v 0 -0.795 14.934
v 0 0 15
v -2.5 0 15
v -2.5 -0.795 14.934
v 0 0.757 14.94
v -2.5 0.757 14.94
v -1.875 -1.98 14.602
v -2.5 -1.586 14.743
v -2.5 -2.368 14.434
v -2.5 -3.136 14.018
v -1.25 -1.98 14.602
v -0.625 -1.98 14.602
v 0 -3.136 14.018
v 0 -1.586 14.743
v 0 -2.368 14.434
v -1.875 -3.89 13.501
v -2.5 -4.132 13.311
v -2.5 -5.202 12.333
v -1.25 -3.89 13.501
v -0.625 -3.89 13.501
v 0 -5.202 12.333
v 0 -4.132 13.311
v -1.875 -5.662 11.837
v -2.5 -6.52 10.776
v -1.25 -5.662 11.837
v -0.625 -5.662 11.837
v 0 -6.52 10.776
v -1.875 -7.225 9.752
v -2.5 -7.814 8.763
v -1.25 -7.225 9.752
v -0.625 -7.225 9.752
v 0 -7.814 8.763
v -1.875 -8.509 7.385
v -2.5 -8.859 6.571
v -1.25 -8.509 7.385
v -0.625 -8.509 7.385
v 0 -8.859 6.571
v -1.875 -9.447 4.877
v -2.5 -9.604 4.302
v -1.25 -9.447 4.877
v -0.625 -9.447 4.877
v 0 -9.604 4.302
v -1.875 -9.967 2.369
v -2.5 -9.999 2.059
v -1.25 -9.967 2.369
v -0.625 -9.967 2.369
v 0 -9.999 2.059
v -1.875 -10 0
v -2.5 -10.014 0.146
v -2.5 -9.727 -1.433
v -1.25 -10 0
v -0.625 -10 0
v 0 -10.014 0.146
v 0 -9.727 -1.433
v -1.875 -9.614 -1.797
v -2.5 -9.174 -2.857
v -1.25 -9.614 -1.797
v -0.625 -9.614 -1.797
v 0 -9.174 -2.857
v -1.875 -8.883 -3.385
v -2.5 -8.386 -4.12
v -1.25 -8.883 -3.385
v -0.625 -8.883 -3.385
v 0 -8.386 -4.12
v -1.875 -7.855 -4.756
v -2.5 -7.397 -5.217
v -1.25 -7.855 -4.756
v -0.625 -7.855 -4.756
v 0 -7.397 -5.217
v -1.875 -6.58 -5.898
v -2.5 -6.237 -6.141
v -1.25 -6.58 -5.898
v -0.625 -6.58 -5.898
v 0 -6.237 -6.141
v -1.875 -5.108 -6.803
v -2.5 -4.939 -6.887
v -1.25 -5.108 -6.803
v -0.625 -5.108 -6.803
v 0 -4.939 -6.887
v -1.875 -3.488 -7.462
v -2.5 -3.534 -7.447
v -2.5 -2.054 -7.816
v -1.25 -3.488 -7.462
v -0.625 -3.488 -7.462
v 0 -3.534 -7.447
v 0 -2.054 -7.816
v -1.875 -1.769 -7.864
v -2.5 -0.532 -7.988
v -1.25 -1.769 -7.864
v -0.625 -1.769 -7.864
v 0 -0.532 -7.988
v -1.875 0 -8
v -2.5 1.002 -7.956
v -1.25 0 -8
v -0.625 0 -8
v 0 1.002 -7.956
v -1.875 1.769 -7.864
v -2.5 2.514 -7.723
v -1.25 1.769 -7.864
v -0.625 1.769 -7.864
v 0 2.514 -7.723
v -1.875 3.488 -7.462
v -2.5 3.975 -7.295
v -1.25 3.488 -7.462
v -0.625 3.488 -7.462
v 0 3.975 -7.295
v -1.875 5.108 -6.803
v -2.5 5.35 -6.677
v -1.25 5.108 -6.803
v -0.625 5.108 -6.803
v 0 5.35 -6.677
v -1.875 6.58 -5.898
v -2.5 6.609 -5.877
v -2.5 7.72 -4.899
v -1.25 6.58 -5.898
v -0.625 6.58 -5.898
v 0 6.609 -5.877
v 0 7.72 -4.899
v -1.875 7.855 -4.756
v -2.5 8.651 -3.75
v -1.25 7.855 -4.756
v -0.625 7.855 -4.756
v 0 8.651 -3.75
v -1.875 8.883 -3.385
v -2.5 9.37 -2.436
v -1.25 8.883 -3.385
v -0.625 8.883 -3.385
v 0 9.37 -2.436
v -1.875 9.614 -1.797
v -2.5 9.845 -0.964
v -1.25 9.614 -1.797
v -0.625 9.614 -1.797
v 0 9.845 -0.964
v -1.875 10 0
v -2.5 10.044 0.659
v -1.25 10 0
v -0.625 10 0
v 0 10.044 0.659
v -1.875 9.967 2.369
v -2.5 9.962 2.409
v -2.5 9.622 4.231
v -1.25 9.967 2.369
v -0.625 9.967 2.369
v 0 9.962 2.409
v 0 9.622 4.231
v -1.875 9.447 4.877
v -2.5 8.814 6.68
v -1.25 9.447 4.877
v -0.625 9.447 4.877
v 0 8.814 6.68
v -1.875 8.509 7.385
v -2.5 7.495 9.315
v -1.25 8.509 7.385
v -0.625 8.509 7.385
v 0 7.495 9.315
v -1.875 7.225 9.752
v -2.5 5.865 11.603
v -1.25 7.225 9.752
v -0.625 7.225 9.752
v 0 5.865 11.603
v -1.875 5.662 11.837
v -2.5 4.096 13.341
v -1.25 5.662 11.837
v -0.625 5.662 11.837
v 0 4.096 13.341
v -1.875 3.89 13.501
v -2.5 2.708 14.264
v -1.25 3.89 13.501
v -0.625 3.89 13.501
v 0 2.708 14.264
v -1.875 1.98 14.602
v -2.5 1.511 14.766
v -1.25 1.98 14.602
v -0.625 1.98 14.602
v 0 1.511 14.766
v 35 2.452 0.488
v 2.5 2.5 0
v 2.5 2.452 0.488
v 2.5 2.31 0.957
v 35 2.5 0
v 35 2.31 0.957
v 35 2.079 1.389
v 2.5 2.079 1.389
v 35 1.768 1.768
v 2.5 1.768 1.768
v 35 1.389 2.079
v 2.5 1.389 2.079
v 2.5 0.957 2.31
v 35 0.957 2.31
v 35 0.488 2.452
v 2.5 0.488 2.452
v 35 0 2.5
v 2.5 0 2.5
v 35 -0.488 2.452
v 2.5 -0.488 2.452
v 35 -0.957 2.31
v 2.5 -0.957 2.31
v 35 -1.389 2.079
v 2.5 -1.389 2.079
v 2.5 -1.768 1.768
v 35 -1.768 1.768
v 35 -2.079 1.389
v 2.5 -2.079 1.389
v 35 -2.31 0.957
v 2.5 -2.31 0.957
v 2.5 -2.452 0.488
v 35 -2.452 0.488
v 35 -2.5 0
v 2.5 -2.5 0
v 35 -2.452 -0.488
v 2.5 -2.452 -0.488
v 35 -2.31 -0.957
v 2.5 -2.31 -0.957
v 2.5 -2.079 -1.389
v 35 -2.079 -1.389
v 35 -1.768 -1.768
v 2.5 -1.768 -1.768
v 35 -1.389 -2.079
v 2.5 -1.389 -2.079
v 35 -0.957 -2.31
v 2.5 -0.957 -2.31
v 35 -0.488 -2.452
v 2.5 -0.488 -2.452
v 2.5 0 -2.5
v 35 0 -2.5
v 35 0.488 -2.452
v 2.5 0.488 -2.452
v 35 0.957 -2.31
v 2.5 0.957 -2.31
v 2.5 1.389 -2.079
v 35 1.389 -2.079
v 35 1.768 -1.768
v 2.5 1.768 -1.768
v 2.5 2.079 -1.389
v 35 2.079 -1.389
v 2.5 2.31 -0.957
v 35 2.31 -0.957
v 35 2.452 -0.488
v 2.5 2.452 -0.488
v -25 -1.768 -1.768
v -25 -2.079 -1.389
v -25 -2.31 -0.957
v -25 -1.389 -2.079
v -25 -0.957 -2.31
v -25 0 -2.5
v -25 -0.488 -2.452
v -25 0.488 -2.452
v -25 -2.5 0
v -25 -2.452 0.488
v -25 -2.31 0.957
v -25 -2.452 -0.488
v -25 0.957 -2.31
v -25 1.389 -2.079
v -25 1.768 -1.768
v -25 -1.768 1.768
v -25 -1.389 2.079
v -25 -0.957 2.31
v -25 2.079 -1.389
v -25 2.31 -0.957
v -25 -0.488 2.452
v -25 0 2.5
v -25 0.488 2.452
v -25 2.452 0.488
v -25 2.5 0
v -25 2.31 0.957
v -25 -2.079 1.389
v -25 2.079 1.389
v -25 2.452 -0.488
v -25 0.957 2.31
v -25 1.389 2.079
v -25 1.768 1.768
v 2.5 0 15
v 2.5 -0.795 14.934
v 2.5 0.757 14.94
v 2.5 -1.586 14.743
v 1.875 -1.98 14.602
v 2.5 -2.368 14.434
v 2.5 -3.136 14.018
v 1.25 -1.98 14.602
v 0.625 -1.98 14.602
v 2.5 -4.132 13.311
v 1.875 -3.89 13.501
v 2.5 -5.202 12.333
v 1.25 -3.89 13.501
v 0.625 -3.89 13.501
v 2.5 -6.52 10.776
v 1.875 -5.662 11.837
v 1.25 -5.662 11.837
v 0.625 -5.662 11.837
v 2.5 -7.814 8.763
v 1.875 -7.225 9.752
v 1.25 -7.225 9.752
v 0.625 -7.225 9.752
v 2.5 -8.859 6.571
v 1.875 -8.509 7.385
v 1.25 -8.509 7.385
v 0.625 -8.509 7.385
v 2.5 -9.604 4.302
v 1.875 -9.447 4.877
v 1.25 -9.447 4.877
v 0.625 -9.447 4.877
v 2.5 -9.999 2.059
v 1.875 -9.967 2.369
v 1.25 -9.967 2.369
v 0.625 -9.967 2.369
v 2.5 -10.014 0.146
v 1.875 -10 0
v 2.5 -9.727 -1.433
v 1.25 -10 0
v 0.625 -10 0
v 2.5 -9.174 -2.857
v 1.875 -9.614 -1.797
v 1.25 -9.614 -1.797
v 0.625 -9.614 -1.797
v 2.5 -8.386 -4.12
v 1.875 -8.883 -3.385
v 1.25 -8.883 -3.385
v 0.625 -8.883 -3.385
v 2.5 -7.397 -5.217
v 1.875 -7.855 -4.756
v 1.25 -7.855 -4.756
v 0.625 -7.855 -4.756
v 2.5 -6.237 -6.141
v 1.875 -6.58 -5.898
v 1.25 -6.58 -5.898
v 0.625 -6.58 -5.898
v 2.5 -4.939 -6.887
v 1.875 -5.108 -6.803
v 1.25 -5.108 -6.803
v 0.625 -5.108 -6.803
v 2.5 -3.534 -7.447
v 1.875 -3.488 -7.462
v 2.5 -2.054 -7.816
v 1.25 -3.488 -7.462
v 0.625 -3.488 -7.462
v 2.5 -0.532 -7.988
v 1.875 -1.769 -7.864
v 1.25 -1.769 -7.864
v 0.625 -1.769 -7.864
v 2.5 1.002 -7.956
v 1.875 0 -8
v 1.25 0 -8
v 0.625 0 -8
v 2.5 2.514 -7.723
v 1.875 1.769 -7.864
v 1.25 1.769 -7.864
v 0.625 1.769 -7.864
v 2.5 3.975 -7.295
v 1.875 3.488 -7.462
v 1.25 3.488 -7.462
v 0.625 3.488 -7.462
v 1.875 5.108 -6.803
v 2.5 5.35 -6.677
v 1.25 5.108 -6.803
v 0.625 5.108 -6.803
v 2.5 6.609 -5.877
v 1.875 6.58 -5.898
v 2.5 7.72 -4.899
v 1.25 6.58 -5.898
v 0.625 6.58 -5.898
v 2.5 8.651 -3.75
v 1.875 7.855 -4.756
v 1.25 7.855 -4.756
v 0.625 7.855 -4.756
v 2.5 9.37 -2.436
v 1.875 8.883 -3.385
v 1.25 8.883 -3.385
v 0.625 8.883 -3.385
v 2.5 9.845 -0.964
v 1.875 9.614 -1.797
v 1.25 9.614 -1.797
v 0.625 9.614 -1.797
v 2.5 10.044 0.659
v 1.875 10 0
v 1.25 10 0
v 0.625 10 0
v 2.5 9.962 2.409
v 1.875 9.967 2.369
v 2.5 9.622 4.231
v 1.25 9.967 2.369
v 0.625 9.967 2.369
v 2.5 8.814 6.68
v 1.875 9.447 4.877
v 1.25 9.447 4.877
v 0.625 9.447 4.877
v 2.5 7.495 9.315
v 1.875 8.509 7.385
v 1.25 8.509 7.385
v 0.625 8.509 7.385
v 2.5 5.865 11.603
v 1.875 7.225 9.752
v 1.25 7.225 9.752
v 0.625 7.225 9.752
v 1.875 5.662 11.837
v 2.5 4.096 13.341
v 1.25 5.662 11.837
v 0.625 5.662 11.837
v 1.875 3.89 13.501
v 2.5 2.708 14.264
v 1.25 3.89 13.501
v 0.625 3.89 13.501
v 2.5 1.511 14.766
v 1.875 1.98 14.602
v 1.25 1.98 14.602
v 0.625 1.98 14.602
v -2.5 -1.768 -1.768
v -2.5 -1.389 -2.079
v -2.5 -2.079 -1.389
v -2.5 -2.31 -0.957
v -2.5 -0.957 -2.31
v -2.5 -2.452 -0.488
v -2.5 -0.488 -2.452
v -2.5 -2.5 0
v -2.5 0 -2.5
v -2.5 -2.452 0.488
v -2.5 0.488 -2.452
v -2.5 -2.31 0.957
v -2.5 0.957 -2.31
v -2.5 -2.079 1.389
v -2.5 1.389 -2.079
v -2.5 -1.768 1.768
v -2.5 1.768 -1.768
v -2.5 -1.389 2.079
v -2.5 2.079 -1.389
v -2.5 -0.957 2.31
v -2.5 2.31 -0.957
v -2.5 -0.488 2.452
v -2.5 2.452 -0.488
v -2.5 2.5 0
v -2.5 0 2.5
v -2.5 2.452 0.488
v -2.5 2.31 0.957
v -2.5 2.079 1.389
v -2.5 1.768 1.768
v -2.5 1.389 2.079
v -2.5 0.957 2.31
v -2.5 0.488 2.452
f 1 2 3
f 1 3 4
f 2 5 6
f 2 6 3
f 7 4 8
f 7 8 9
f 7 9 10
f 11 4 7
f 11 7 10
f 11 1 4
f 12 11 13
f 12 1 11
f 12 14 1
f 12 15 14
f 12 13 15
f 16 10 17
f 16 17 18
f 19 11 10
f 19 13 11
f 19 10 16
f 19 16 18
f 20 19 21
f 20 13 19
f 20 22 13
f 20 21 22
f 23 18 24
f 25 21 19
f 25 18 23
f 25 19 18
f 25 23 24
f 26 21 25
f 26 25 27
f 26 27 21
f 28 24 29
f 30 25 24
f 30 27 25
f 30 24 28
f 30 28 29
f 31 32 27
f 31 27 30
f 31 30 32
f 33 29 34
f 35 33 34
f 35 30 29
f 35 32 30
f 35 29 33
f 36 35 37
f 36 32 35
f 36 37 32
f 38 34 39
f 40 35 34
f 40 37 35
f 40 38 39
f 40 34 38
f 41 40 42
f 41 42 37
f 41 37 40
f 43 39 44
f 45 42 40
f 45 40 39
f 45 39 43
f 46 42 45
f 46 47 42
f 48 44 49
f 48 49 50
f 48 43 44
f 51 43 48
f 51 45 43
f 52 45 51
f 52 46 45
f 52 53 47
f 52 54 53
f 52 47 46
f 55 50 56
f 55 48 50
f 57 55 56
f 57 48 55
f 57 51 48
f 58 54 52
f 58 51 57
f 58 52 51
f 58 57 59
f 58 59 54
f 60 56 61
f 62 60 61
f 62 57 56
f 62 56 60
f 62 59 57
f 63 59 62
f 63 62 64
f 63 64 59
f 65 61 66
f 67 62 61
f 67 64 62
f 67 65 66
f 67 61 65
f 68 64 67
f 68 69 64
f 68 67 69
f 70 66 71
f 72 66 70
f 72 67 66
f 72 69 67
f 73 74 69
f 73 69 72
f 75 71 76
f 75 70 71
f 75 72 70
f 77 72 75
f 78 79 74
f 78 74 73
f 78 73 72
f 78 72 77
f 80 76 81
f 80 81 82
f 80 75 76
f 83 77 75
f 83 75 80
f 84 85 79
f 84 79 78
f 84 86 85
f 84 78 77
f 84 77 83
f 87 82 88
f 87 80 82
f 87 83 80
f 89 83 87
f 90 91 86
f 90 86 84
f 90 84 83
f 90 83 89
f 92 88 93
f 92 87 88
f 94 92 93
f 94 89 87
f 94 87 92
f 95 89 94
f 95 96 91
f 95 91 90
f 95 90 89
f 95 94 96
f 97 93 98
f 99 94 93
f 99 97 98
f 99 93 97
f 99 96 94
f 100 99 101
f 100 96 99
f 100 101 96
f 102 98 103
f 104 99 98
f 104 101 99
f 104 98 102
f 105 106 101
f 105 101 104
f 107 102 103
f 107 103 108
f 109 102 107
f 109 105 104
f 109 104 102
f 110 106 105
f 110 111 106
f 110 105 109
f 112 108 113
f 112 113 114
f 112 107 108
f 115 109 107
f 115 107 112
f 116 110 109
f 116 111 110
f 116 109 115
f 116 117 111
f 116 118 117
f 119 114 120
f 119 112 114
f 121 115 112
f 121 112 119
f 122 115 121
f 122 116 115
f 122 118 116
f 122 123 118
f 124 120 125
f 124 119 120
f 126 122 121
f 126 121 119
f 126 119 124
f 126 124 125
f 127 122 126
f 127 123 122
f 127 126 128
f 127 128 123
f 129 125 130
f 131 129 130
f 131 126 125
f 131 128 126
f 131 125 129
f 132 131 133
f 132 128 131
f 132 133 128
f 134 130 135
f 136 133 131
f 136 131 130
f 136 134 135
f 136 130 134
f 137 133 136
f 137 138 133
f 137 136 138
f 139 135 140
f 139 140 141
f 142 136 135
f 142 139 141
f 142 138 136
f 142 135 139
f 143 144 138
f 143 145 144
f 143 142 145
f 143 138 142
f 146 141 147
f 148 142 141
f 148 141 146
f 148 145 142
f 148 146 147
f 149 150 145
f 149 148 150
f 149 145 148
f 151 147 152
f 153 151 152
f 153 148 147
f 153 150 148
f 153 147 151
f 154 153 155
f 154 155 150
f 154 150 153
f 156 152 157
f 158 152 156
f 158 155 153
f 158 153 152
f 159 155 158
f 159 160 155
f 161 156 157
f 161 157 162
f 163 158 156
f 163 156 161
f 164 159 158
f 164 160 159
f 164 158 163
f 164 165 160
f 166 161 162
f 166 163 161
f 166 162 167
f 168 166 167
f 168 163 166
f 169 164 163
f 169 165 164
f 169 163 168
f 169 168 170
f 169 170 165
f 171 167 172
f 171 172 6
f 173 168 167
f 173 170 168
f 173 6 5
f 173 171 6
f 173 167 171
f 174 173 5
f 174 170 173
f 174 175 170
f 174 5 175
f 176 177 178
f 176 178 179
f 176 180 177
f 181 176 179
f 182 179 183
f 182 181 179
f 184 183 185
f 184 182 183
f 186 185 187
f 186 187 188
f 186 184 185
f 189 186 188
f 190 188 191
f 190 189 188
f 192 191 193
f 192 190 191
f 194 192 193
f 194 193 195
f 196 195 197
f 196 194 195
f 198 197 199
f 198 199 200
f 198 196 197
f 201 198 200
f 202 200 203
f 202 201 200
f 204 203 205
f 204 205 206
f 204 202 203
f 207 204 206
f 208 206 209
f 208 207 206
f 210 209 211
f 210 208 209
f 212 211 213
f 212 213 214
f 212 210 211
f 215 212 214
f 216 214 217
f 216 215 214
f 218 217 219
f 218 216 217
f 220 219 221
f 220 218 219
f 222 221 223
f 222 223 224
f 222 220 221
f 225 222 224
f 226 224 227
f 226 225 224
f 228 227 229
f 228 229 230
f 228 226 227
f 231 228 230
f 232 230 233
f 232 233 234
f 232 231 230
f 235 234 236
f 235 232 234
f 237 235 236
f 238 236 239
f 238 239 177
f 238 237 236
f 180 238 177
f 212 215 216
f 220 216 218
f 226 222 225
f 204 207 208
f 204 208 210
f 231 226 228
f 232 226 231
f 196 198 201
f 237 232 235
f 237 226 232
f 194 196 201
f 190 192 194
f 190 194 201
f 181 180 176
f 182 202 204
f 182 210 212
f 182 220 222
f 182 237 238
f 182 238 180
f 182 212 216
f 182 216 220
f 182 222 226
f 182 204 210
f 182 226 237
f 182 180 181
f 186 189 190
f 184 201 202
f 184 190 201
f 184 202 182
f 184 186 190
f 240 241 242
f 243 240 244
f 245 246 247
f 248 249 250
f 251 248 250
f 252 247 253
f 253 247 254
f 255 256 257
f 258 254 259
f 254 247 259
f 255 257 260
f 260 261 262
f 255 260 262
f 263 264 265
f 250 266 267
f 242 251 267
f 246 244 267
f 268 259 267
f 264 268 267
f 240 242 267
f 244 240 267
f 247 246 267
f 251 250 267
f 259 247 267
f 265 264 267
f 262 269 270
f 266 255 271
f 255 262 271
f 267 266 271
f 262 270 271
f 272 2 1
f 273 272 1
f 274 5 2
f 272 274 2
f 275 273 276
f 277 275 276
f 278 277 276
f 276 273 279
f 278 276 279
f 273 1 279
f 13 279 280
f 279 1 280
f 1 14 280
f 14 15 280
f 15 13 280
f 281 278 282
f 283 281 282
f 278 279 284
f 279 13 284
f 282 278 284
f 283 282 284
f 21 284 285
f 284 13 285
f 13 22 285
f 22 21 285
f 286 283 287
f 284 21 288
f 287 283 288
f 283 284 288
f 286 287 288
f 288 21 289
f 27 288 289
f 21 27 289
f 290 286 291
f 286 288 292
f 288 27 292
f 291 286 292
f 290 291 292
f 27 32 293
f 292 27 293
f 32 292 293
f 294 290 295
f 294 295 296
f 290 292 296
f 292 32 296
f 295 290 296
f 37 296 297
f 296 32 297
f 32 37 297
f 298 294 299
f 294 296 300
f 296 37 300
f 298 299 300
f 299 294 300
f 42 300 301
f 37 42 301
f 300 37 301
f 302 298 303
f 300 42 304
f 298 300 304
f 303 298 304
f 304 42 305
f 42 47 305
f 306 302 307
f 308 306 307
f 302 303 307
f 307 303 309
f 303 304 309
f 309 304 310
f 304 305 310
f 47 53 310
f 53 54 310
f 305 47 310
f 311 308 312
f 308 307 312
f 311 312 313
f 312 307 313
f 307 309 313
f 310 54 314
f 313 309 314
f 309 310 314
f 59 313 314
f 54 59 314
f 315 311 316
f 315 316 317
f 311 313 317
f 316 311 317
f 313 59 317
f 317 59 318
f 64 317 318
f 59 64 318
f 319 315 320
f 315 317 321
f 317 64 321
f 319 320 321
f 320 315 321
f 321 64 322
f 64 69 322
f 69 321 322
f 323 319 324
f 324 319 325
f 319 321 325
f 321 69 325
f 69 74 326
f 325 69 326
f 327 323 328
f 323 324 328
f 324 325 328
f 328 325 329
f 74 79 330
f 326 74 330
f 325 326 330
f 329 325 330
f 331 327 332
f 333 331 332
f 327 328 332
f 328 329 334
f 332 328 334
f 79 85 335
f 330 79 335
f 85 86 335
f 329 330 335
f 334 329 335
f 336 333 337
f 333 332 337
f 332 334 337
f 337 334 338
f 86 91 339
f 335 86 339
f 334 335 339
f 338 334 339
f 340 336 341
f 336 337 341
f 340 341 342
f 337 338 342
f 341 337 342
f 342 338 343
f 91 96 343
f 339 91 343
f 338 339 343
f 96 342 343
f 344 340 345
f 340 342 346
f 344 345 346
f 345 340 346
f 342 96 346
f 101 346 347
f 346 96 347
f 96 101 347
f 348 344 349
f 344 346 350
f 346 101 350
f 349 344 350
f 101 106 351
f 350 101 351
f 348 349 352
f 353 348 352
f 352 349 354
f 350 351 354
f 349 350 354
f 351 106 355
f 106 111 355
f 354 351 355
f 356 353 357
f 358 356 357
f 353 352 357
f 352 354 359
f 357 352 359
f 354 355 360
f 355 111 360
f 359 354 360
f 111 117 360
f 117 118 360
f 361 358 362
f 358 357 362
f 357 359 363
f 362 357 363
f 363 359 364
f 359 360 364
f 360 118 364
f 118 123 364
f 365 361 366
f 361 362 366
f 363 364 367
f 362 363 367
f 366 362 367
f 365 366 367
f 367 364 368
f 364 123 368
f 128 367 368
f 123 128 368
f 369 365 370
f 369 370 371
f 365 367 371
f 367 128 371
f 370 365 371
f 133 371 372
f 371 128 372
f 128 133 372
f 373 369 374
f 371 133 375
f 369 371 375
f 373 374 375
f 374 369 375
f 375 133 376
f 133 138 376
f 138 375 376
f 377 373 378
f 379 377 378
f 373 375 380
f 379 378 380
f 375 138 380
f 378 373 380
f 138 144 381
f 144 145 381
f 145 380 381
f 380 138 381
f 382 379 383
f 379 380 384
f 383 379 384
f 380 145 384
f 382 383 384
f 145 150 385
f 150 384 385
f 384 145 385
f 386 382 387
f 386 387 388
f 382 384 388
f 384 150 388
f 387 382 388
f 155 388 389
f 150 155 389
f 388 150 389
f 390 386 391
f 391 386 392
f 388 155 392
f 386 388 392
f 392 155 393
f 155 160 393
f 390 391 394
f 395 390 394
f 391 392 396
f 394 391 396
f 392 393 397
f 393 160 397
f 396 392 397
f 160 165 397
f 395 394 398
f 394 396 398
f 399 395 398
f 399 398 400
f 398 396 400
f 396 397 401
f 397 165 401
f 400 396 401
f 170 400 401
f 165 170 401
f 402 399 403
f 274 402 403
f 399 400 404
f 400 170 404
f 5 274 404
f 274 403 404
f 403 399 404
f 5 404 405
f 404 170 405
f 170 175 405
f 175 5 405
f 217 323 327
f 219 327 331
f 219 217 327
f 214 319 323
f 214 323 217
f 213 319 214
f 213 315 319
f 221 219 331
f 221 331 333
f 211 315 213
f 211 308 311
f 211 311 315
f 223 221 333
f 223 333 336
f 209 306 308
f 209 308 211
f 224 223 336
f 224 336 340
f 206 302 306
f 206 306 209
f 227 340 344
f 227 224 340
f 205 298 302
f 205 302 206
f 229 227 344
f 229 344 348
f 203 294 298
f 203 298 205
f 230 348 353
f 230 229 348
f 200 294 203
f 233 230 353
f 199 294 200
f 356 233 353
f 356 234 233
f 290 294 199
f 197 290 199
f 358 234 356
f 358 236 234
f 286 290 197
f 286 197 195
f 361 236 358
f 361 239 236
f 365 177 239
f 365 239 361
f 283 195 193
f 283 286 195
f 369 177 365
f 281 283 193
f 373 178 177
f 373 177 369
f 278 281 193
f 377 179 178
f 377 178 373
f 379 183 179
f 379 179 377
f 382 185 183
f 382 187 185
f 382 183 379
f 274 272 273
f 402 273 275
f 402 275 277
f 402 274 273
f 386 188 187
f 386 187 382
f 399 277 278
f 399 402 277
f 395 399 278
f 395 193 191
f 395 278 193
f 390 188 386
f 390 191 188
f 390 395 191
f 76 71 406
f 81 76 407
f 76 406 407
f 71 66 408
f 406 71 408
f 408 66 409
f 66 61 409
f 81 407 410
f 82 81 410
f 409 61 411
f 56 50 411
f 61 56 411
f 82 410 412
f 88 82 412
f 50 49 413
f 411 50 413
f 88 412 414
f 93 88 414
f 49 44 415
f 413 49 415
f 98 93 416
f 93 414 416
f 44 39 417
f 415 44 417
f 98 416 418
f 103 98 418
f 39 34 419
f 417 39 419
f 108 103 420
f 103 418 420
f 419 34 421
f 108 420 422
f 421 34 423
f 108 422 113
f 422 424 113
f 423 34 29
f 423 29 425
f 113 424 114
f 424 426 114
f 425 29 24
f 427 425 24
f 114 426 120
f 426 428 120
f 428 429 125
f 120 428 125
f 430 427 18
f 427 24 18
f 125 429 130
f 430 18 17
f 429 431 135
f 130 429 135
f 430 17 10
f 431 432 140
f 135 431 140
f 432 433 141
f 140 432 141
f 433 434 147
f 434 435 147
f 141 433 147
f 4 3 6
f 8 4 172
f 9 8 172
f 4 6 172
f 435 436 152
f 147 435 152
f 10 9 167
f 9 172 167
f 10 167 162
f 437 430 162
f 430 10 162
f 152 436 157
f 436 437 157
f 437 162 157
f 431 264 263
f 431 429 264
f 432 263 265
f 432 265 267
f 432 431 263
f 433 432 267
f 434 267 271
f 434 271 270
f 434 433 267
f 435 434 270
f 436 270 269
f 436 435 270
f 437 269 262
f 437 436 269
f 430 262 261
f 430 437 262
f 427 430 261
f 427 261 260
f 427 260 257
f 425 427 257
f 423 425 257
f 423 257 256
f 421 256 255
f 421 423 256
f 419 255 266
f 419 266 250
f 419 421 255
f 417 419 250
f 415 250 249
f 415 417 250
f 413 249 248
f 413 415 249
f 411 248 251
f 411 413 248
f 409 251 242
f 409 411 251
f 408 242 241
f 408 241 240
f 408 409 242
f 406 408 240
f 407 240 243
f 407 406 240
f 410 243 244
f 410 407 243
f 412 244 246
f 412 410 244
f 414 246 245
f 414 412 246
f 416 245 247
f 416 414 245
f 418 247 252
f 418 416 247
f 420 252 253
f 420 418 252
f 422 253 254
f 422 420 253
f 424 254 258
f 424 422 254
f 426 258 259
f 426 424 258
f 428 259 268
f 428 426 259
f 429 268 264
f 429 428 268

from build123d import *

# Parameters (mm, degrees)
F0_R          = 2.5
F1_DEPTH      = 35
F1_DEPTH_BACK = 25
F2_DEPTH      = 2.5
F2_DEPTH_BACK = 2.5


with BuildPart() as f1:
    # F0 (on Right) → F1 (new body, two sides)
    with BuildSketch(Plane.YZ) as f1_sk:
        Circle(F0_R)
    extrude(amount=F1_DEPTH)
    extrude(f1_sk.sketch, amount=-F1_DEPTH_BACK)

    # F0 (on Right) → F2 (join, two sides)
    with BuildSketch(Plane.YZ) as f2_sk:
        with BuildLine():
            add(Edge.make_bspline(
                [(0, 15), (-5.3107975246, 15), (-15.0976959297, -1.5753129223), (0, -10.9383719229), (15.0976959297, -1.5753129223), (5.3107975246, 15), (0, 15)],
                knots=[0, 0, 0, 0, 0.2713217868, 0.5, 0.7286782132, 1, 1, 1, 1], degree=3))
        make_face()
        Circle(F0_R, mode=Mode.SUBTRACT)
    extrude(amount=F2_DEPTH)
    extrude(f2_sk.sketch, amount=-F2_DEPTH_BACK)


solid = f1.part
